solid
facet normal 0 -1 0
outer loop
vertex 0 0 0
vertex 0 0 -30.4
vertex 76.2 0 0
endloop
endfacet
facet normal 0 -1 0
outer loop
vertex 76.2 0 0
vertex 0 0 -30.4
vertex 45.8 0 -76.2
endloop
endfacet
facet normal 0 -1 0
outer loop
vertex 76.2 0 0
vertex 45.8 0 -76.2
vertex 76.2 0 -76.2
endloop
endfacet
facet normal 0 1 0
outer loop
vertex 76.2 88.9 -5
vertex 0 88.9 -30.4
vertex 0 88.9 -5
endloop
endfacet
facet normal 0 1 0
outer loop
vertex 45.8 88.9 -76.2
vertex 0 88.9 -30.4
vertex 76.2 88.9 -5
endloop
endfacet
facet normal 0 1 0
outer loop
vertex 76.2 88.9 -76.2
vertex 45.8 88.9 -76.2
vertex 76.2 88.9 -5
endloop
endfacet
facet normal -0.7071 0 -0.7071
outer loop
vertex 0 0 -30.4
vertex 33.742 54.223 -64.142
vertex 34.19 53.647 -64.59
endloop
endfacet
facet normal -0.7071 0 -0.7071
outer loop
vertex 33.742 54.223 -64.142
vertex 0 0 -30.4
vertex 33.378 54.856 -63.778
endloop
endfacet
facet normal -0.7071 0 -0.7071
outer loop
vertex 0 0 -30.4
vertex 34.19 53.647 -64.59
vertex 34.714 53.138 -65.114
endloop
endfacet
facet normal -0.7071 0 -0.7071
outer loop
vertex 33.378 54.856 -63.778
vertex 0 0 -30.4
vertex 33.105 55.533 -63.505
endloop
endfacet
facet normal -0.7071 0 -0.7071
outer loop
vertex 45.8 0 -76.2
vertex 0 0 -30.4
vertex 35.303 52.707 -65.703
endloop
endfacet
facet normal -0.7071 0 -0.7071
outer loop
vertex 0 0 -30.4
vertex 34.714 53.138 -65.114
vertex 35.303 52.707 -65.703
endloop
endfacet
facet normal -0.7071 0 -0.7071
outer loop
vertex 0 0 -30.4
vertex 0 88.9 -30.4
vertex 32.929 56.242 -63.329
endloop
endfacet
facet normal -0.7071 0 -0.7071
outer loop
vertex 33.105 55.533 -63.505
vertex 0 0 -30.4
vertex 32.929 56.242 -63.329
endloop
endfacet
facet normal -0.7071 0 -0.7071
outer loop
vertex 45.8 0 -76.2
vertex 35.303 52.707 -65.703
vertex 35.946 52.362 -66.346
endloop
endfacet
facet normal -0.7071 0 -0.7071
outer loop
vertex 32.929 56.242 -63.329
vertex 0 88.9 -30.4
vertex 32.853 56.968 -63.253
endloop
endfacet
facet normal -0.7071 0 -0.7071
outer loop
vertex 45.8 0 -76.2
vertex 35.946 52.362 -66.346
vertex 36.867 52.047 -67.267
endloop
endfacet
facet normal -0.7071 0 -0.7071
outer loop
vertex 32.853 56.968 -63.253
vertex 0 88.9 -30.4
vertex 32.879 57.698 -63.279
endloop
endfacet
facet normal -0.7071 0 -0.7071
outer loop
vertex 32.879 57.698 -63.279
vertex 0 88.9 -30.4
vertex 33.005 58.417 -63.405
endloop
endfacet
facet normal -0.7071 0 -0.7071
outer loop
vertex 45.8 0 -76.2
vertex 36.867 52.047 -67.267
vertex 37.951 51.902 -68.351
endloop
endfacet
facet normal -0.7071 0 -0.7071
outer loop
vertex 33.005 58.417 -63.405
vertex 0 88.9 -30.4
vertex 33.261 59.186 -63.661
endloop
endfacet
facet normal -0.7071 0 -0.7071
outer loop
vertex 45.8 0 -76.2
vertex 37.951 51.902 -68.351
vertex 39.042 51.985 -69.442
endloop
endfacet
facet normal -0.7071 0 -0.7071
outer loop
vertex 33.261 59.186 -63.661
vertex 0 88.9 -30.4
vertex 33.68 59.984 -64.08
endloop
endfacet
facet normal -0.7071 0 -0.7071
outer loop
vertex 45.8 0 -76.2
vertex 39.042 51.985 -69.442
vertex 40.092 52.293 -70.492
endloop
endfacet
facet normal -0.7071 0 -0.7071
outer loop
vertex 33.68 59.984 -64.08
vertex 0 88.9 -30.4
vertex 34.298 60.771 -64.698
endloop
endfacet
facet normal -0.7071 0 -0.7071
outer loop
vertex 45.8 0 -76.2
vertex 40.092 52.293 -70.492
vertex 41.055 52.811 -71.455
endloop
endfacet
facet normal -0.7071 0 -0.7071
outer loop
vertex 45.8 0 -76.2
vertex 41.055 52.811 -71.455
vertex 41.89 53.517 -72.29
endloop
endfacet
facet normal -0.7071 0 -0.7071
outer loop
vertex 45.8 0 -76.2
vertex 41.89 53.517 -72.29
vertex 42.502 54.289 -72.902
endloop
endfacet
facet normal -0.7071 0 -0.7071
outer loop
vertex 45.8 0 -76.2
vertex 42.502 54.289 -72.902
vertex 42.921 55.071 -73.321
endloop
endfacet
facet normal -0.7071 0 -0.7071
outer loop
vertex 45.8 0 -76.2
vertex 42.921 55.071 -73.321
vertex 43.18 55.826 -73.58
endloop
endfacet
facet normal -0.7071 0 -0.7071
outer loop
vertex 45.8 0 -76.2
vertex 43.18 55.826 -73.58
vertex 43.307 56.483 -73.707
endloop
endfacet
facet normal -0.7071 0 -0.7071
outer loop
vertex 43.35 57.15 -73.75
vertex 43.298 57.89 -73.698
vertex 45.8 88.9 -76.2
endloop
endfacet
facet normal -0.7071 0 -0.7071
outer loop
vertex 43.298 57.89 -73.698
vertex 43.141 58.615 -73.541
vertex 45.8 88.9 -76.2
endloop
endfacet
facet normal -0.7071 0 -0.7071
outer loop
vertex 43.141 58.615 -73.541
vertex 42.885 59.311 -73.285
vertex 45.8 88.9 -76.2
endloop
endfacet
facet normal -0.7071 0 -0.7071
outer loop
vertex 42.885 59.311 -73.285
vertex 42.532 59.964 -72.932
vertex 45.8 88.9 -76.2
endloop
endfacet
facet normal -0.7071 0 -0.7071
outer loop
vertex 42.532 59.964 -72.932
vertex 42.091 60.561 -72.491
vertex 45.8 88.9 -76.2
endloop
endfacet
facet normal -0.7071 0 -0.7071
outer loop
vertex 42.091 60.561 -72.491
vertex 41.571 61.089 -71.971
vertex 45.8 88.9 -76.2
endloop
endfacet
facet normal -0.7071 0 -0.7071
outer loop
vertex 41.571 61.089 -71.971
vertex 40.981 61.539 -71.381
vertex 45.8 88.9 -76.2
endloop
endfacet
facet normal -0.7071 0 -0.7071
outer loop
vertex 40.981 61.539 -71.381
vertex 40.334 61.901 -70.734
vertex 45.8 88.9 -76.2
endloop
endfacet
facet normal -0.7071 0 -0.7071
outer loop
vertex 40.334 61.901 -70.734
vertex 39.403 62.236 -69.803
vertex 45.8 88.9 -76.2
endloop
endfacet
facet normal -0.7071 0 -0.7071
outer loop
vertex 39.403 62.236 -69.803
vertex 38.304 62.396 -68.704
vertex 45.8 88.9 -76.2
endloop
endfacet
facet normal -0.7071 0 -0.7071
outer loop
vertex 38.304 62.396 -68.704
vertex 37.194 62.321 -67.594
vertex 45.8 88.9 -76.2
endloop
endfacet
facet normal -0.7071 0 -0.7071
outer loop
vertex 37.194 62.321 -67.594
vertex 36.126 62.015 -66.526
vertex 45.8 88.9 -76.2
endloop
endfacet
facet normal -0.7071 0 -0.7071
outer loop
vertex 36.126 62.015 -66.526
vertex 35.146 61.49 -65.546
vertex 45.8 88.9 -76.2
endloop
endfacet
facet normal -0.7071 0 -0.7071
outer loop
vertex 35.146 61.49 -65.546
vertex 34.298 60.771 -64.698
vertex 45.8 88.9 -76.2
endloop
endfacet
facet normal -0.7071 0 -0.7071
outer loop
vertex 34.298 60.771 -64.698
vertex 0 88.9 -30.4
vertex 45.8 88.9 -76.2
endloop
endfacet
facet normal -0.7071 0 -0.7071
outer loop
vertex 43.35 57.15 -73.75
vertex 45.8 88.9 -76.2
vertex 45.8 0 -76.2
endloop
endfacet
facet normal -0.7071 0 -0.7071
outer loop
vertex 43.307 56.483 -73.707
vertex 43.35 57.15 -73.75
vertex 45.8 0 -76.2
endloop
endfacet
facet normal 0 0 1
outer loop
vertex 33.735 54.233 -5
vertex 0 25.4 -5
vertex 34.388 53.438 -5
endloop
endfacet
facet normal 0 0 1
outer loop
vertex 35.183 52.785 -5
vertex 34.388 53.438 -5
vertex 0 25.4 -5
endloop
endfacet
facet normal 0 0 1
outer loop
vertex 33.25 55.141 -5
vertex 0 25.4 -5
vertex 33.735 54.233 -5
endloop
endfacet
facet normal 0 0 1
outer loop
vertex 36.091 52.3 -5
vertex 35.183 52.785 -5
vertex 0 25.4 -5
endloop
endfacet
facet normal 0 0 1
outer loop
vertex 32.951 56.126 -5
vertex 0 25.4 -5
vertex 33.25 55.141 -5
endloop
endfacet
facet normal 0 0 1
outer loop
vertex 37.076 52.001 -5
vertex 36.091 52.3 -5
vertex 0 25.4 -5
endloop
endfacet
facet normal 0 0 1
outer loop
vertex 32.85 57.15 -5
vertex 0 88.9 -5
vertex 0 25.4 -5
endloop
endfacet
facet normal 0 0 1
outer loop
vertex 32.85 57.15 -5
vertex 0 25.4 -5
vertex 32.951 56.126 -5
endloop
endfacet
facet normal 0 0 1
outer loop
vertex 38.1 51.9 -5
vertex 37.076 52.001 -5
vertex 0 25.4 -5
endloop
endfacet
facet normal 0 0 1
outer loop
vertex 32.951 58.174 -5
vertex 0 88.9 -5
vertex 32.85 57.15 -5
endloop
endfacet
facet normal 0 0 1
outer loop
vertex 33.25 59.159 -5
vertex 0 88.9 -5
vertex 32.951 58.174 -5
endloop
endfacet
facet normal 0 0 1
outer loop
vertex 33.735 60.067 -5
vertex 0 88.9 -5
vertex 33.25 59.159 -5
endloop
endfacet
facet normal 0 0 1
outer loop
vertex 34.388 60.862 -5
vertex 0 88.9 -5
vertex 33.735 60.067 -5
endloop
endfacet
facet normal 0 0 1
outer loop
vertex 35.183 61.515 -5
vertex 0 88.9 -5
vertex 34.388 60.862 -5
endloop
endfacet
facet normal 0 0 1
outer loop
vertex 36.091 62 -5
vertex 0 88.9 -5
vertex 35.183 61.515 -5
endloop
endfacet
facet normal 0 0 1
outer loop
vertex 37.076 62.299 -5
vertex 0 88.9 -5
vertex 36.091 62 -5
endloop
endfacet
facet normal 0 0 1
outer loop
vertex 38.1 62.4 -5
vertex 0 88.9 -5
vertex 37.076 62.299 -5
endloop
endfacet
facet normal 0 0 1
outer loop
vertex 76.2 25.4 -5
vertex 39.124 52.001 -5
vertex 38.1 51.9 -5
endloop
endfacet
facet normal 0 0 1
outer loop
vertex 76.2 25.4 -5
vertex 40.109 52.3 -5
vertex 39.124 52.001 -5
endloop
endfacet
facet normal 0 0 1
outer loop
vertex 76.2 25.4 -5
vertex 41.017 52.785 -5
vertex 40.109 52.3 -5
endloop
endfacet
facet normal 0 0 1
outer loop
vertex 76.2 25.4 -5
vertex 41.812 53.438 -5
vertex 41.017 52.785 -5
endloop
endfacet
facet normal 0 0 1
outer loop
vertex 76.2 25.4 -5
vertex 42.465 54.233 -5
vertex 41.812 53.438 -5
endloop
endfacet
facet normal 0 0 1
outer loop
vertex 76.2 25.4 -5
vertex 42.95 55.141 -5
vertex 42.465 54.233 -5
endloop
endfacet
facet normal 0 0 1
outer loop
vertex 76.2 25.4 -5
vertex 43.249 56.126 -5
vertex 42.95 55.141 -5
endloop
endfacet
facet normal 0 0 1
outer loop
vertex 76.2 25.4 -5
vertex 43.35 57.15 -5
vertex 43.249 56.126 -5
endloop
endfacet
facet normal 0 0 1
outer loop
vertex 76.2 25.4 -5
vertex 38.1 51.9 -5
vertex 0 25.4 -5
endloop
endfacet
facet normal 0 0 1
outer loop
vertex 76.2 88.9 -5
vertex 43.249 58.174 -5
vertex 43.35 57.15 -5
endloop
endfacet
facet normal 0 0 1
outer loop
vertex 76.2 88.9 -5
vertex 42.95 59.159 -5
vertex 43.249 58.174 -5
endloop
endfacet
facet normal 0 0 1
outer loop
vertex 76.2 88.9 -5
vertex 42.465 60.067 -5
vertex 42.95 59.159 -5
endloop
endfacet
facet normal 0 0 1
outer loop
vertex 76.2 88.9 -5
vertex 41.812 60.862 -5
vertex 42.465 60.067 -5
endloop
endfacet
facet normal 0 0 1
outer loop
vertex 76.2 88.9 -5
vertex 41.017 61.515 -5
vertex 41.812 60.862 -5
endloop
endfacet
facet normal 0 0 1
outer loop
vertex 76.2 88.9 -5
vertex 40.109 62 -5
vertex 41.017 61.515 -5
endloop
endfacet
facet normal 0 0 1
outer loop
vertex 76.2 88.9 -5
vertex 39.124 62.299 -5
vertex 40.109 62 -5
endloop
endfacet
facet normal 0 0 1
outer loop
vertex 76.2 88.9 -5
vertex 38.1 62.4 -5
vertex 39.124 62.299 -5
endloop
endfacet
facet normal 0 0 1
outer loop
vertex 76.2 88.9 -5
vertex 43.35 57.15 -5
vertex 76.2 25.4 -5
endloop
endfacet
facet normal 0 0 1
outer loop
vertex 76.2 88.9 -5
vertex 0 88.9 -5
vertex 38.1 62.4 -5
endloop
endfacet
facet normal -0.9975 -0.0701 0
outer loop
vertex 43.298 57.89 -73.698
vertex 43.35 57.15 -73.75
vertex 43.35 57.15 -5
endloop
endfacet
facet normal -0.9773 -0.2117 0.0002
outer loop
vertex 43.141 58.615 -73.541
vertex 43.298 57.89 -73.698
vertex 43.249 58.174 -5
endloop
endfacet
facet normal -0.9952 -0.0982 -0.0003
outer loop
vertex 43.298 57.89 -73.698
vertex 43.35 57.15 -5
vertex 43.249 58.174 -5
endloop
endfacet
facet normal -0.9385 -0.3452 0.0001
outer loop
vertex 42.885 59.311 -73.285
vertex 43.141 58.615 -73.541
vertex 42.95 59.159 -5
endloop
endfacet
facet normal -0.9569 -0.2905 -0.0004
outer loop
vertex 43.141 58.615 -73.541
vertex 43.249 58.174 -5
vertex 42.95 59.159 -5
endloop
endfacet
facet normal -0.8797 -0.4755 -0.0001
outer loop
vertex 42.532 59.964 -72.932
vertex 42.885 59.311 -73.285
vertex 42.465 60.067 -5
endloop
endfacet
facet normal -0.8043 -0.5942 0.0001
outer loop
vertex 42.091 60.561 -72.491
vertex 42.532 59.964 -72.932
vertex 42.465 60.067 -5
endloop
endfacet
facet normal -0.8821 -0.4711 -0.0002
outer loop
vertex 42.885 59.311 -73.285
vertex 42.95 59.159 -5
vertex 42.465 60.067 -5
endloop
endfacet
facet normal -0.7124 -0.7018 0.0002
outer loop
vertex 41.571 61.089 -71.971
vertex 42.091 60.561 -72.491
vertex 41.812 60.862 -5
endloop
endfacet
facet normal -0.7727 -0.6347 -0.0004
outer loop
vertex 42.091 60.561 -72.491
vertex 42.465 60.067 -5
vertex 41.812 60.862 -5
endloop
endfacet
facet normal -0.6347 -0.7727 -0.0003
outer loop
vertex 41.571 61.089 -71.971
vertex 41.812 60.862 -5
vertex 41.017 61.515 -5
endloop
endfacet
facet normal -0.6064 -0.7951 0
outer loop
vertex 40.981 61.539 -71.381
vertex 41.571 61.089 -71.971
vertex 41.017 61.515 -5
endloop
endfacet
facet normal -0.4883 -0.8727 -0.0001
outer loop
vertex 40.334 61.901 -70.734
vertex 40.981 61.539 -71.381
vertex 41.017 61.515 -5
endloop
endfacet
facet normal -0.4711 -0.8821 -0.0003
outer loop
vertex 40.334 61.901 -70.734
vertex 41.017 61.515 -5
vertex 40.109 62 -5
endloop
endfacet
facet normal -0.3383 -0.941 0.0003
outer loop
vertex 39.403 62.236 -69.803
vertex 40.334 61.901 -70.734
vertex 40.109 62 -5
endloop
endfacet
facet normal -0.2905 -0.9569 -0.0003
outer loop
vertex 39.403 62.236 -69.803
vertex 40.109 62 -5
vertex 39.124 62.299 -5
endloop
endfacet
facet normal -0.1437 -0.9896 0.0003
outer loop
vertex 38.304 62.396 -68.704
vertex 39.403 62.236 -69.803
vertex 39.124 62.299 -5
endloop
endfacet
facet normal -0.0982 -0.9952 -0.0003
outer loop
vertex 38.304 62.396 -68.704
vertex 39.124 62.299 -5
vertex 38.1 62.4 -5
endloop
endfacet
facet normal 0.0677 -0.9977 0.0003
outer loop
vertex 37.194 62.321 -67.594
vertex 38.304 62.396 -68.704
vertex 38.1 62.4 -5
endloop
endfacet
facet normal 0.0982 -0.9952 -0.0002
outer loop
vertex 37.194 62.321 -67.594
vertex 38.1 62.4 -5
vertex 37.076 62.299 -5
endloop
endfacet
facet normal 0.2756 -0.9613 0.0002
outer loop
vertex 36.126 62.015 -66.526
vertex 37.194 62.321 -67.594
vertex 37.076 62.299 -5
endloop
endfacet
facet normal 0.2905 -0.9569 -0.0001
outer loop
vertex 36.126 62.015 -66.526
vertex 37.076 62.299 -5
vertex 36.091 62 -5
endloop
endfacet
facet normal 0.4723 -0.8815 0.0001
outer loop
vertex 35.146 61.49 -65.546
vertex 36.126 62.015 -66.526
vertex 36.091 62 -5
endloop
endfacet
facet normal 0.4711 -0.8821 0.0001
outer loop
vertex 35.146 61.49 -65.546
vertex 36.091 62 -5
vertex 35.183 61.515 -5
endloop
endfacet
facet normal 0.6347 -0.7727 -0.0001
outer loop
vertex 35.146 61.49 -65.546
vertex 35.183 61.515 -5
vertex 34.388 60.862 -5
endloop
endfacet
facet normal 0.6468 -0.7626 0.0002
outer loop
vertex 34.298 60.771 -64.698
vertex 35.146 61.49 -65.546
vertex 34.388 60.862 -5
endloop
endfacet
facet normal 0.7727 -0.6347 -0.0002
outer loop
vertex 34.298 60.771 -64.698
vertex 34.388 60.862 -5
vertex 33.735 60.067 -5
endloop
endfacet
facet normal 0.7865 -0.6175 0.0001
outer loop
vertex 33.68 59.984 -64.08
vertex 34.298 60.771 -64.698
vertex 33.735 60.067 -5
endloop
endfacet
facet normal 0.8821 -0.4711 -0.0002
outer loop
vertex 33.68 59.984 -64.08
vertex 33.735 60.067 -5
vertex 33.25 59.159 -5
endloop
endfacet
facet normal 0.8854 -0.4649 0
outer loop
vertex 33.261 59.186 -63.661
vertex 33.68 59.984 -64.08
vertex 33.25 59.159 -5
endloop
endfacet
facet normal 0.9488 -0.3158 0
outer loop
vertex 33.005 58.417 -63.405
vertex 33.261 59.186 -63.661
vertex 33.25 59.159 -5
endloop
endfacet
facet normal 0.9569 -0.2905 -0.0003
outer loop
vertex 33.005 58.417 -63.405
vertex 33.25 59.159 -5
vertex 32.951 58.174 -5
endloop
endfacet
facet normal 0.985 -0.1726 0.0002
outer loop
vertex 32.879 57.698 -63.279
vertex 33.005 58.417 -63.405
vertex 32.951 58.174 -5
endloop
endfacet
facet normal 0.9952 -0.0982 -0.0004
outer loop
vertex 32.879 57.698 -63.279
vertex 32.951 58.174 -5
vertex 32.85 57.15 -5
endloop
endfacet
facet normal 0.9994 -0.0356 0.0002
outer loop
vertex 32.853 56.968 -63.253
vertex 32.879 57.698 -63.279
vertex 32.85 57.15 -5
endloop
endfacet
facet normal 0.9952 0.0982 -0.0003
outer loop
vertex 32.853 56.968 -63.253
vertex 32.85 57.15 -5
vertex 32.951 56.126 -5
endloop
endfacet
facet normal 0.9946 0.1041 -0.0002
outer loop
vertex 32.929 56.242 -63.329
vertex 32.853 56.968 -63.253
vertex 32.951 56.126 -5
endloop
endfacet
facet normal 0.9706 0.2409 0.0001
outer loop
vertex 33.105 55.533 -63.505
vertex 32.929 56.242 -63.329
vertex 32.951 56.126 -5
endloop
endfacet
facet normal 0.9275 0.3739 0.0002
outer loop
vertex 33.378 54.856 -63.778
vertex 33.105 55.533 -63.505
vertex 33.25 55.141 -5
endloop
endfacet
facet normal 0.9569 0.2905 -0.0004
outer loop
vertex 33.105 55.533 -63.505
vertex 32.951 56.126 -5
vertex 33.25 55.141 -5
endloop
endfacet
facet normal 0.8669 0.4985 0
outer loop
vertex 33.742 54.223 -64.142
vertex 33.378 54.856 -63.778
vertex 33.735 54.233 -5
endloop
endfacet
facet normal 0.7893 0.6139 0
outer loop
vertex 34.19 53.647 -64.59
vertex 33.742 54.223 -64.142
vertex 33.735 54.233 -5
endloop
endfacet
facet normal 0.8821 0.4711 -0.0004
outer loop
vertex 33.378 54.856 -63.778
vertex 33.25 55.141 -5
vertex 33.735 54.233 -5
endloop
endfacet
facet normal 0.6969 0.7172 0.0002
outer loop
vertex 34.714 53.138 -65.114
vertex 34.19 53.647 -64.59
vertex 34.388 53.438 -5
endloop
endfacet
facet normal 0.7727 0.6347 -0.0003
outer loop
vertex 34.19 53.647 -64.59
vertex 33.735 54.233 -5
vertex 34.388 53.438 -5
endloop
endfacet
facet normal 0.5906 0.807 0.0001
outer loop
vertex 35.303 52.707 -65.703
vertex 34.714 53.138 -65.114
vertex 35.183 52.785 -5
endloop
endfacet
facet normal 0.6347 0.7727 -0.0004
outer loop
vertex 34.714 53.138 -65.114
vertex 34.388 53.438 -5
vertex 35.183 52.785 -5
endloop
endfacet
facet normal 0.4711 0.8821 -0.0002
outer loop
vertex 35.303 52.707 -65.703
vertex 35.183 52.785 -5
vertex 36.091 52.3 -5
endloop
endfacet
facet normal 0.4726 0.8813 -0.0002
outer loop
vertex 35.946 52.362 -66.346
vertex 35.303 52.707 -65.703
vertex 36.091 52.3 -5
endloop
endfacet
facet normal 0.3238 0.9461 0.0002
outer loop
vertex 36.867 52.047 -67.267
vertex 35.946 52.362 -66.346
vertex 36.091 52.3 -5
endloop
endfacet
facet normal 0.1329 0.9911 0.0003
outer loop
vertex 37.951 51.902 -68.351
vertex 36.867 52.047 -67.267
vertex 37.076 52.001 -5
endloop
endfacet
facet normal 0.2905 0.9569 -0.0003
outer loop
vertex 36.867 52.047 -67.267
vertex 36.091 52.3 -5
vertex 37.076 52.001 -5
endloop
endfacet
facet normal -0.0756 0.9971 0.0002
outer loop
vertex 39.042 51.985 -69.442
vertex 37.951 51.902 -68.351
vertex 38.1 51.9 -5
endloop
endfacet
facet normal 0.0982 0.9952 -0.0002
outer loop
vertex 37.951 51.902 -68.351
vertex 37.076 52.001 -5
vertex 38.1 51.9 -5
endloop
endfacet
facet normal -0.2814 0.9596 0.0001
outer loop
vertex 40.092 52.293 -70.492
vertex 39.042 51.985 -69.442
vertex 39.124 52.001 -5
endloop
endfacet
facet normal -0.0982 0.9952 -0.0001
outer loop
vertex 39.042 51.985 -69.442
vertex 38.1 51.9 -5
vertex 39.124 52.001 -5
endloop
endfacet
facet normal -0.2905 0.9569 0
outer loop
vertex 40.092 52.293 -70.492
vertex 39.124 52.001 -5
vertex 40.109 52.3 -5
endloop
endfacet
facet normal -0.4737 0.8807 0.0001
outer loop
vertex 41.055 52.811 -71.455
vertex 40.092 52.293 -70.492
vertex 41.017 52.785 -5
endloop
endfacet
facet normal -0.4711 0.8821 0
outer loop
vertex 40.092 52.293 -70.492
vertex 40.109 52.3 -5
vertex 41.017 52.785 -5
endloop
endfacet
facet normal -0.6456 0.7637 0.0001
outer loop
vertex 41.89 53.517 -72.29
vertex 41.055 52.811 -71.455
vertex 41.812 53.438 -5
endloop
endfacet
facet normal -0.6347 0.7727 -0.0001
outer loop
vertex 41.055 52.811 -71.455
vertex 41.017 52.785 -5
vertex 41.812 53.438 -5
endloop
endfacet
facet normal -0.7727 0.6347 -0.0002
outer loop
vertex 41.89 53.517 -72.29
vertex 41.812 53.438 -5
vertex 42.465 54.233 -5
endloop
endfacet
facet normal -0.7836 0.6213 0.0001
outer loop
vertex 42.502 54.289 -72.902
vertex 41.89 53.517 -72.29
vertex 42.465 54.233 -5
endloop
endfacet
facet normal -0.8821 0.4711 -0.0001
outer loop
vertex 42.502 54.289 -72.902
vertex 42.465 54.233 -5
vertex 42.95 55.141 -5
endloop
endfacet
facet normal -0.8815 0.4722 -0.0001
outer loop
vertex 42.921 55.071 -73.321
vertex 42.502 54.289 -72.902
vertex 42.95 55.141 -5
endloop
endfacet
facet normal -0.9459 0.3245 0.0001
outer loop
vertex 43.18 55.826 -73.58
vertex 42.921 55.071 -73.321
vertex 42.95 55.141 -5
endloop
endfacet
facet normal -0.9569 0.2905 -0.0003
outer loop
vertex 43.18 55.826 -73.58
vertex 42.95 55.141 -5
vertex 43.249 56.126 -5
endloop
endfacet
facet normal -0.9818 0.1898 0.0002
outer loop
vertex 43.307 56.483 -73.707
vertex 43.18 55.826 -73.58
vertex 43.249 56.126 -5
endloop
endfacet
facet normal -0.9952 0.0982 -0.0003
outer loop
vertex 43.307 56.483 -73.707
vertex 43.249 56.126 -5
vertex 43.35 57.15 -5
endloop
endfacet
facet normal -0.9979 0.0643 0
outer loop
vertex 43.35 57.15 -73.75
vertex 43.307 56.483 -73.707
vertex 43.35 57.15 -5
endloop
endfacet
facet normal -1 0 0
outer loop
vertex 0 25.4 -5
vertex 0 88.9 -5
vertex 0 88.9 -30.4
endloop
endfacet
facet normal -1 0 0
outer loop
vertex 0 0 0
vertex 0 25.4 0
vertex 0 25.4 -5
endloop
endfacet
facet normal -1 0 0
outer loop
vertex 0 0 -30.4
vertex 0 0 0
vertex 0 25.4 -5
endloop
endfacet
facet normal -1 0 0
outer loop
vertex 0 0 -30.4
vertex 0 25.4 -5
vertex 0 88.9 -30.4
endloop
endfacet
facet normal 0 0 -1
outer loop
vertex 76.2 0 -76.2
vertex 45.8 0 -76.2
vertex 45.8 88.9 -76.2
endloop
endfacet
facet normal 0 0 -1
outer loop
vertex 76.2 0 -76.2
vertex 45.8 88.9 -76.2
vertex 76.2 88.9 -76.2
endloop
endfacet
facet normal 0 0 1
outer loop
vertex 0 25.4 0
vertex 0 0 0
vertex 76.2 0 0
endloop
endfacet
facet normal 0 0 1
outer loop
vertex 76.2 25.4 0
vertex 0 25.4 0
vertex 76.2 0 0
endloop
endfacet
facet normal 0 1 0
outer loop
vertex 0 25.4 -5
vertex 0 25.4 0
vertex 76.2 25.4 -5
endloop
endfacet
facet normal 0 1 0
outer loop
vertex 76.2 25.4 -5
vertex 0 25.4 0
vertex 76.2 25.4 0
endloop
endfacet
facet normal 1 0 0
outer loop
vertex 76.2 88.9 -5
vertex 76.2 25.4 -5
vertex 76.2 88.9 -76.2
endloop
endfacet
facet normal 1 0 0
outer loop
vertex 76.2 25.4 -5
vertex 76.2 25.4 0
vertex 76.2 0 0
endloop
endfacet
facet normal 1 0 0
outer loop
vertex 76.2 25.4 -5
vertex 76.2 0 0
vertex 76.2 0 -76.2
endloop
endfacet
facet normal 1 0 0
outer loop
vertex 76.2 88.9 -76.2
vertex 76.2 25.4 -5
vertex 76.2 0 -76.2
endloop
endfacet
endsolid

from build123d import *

# Parameters (mm, degrees)
SKETCH1_W           = 76.2
SKETCH1_H           = 76.2
BOSS_EXTRUDE1_DEPTH = 88.9
SKETCH2_R           = 5.25
CUT_EXTRUDE1_DEPTH  = 300
SKETCH3_W           = 76.2
SKETCH3_H           = 63.5
CUT_EXTRUDE2_DEPTH  = 5
CUT_EXTRUDE5_DEPTH  = 140.7


with BuildPart() as part:
    # Sketch1 → Boss-Extrude1 (new body)
    with BuildSketch(Plane(origin=(0, 0, 0), x_dir=(1, 0, 0), z_dir=(0, 1, 0))):
        with Locations((38.1, 38.1)):
            Rectangle(SKETCH1_W, SKETCH1_H)
    extrude(amount=BOSS_EXTRUDE1_DEPTH)

    # Sketch2 → Cut-Extrude1 (cut)
    with BuildSketch(Plane.XY):
        with Locations((38.1, 57.15)):
            Circle(SKETCH2_R)
    extrude(amount=-CUT_EXTRUDE1_DEPTH, mode=Mode.SUBTRACT)

    # Sketch3 → Cut-Extrude2 (cut)
    with BuildSketch(Plane.XY):
        with Locations((38.1, 57.15)):
            Rectangle(SKETCH3_W, SKETCH3_H)
    extrude(amount=-CUT_EXTRUDE2_DEPTH, mode=Mode.SUBTRACT)

    # Sketch5 → Cut-Extrude5 (cut, through all)
    with BuildSketch(Plane(origin=(0, 88.9, 0), x_dir=(1, 0, 0), z_dir=(0, 1, 0))):
        Polygon((0, 76.2), (0, 30.4), (45.8, 76.2), align=None)
    extrude(amount=-CUT_EXTRUDE5_DEPTH, mode=Mode.SUBTRACT)


solid = part.part
